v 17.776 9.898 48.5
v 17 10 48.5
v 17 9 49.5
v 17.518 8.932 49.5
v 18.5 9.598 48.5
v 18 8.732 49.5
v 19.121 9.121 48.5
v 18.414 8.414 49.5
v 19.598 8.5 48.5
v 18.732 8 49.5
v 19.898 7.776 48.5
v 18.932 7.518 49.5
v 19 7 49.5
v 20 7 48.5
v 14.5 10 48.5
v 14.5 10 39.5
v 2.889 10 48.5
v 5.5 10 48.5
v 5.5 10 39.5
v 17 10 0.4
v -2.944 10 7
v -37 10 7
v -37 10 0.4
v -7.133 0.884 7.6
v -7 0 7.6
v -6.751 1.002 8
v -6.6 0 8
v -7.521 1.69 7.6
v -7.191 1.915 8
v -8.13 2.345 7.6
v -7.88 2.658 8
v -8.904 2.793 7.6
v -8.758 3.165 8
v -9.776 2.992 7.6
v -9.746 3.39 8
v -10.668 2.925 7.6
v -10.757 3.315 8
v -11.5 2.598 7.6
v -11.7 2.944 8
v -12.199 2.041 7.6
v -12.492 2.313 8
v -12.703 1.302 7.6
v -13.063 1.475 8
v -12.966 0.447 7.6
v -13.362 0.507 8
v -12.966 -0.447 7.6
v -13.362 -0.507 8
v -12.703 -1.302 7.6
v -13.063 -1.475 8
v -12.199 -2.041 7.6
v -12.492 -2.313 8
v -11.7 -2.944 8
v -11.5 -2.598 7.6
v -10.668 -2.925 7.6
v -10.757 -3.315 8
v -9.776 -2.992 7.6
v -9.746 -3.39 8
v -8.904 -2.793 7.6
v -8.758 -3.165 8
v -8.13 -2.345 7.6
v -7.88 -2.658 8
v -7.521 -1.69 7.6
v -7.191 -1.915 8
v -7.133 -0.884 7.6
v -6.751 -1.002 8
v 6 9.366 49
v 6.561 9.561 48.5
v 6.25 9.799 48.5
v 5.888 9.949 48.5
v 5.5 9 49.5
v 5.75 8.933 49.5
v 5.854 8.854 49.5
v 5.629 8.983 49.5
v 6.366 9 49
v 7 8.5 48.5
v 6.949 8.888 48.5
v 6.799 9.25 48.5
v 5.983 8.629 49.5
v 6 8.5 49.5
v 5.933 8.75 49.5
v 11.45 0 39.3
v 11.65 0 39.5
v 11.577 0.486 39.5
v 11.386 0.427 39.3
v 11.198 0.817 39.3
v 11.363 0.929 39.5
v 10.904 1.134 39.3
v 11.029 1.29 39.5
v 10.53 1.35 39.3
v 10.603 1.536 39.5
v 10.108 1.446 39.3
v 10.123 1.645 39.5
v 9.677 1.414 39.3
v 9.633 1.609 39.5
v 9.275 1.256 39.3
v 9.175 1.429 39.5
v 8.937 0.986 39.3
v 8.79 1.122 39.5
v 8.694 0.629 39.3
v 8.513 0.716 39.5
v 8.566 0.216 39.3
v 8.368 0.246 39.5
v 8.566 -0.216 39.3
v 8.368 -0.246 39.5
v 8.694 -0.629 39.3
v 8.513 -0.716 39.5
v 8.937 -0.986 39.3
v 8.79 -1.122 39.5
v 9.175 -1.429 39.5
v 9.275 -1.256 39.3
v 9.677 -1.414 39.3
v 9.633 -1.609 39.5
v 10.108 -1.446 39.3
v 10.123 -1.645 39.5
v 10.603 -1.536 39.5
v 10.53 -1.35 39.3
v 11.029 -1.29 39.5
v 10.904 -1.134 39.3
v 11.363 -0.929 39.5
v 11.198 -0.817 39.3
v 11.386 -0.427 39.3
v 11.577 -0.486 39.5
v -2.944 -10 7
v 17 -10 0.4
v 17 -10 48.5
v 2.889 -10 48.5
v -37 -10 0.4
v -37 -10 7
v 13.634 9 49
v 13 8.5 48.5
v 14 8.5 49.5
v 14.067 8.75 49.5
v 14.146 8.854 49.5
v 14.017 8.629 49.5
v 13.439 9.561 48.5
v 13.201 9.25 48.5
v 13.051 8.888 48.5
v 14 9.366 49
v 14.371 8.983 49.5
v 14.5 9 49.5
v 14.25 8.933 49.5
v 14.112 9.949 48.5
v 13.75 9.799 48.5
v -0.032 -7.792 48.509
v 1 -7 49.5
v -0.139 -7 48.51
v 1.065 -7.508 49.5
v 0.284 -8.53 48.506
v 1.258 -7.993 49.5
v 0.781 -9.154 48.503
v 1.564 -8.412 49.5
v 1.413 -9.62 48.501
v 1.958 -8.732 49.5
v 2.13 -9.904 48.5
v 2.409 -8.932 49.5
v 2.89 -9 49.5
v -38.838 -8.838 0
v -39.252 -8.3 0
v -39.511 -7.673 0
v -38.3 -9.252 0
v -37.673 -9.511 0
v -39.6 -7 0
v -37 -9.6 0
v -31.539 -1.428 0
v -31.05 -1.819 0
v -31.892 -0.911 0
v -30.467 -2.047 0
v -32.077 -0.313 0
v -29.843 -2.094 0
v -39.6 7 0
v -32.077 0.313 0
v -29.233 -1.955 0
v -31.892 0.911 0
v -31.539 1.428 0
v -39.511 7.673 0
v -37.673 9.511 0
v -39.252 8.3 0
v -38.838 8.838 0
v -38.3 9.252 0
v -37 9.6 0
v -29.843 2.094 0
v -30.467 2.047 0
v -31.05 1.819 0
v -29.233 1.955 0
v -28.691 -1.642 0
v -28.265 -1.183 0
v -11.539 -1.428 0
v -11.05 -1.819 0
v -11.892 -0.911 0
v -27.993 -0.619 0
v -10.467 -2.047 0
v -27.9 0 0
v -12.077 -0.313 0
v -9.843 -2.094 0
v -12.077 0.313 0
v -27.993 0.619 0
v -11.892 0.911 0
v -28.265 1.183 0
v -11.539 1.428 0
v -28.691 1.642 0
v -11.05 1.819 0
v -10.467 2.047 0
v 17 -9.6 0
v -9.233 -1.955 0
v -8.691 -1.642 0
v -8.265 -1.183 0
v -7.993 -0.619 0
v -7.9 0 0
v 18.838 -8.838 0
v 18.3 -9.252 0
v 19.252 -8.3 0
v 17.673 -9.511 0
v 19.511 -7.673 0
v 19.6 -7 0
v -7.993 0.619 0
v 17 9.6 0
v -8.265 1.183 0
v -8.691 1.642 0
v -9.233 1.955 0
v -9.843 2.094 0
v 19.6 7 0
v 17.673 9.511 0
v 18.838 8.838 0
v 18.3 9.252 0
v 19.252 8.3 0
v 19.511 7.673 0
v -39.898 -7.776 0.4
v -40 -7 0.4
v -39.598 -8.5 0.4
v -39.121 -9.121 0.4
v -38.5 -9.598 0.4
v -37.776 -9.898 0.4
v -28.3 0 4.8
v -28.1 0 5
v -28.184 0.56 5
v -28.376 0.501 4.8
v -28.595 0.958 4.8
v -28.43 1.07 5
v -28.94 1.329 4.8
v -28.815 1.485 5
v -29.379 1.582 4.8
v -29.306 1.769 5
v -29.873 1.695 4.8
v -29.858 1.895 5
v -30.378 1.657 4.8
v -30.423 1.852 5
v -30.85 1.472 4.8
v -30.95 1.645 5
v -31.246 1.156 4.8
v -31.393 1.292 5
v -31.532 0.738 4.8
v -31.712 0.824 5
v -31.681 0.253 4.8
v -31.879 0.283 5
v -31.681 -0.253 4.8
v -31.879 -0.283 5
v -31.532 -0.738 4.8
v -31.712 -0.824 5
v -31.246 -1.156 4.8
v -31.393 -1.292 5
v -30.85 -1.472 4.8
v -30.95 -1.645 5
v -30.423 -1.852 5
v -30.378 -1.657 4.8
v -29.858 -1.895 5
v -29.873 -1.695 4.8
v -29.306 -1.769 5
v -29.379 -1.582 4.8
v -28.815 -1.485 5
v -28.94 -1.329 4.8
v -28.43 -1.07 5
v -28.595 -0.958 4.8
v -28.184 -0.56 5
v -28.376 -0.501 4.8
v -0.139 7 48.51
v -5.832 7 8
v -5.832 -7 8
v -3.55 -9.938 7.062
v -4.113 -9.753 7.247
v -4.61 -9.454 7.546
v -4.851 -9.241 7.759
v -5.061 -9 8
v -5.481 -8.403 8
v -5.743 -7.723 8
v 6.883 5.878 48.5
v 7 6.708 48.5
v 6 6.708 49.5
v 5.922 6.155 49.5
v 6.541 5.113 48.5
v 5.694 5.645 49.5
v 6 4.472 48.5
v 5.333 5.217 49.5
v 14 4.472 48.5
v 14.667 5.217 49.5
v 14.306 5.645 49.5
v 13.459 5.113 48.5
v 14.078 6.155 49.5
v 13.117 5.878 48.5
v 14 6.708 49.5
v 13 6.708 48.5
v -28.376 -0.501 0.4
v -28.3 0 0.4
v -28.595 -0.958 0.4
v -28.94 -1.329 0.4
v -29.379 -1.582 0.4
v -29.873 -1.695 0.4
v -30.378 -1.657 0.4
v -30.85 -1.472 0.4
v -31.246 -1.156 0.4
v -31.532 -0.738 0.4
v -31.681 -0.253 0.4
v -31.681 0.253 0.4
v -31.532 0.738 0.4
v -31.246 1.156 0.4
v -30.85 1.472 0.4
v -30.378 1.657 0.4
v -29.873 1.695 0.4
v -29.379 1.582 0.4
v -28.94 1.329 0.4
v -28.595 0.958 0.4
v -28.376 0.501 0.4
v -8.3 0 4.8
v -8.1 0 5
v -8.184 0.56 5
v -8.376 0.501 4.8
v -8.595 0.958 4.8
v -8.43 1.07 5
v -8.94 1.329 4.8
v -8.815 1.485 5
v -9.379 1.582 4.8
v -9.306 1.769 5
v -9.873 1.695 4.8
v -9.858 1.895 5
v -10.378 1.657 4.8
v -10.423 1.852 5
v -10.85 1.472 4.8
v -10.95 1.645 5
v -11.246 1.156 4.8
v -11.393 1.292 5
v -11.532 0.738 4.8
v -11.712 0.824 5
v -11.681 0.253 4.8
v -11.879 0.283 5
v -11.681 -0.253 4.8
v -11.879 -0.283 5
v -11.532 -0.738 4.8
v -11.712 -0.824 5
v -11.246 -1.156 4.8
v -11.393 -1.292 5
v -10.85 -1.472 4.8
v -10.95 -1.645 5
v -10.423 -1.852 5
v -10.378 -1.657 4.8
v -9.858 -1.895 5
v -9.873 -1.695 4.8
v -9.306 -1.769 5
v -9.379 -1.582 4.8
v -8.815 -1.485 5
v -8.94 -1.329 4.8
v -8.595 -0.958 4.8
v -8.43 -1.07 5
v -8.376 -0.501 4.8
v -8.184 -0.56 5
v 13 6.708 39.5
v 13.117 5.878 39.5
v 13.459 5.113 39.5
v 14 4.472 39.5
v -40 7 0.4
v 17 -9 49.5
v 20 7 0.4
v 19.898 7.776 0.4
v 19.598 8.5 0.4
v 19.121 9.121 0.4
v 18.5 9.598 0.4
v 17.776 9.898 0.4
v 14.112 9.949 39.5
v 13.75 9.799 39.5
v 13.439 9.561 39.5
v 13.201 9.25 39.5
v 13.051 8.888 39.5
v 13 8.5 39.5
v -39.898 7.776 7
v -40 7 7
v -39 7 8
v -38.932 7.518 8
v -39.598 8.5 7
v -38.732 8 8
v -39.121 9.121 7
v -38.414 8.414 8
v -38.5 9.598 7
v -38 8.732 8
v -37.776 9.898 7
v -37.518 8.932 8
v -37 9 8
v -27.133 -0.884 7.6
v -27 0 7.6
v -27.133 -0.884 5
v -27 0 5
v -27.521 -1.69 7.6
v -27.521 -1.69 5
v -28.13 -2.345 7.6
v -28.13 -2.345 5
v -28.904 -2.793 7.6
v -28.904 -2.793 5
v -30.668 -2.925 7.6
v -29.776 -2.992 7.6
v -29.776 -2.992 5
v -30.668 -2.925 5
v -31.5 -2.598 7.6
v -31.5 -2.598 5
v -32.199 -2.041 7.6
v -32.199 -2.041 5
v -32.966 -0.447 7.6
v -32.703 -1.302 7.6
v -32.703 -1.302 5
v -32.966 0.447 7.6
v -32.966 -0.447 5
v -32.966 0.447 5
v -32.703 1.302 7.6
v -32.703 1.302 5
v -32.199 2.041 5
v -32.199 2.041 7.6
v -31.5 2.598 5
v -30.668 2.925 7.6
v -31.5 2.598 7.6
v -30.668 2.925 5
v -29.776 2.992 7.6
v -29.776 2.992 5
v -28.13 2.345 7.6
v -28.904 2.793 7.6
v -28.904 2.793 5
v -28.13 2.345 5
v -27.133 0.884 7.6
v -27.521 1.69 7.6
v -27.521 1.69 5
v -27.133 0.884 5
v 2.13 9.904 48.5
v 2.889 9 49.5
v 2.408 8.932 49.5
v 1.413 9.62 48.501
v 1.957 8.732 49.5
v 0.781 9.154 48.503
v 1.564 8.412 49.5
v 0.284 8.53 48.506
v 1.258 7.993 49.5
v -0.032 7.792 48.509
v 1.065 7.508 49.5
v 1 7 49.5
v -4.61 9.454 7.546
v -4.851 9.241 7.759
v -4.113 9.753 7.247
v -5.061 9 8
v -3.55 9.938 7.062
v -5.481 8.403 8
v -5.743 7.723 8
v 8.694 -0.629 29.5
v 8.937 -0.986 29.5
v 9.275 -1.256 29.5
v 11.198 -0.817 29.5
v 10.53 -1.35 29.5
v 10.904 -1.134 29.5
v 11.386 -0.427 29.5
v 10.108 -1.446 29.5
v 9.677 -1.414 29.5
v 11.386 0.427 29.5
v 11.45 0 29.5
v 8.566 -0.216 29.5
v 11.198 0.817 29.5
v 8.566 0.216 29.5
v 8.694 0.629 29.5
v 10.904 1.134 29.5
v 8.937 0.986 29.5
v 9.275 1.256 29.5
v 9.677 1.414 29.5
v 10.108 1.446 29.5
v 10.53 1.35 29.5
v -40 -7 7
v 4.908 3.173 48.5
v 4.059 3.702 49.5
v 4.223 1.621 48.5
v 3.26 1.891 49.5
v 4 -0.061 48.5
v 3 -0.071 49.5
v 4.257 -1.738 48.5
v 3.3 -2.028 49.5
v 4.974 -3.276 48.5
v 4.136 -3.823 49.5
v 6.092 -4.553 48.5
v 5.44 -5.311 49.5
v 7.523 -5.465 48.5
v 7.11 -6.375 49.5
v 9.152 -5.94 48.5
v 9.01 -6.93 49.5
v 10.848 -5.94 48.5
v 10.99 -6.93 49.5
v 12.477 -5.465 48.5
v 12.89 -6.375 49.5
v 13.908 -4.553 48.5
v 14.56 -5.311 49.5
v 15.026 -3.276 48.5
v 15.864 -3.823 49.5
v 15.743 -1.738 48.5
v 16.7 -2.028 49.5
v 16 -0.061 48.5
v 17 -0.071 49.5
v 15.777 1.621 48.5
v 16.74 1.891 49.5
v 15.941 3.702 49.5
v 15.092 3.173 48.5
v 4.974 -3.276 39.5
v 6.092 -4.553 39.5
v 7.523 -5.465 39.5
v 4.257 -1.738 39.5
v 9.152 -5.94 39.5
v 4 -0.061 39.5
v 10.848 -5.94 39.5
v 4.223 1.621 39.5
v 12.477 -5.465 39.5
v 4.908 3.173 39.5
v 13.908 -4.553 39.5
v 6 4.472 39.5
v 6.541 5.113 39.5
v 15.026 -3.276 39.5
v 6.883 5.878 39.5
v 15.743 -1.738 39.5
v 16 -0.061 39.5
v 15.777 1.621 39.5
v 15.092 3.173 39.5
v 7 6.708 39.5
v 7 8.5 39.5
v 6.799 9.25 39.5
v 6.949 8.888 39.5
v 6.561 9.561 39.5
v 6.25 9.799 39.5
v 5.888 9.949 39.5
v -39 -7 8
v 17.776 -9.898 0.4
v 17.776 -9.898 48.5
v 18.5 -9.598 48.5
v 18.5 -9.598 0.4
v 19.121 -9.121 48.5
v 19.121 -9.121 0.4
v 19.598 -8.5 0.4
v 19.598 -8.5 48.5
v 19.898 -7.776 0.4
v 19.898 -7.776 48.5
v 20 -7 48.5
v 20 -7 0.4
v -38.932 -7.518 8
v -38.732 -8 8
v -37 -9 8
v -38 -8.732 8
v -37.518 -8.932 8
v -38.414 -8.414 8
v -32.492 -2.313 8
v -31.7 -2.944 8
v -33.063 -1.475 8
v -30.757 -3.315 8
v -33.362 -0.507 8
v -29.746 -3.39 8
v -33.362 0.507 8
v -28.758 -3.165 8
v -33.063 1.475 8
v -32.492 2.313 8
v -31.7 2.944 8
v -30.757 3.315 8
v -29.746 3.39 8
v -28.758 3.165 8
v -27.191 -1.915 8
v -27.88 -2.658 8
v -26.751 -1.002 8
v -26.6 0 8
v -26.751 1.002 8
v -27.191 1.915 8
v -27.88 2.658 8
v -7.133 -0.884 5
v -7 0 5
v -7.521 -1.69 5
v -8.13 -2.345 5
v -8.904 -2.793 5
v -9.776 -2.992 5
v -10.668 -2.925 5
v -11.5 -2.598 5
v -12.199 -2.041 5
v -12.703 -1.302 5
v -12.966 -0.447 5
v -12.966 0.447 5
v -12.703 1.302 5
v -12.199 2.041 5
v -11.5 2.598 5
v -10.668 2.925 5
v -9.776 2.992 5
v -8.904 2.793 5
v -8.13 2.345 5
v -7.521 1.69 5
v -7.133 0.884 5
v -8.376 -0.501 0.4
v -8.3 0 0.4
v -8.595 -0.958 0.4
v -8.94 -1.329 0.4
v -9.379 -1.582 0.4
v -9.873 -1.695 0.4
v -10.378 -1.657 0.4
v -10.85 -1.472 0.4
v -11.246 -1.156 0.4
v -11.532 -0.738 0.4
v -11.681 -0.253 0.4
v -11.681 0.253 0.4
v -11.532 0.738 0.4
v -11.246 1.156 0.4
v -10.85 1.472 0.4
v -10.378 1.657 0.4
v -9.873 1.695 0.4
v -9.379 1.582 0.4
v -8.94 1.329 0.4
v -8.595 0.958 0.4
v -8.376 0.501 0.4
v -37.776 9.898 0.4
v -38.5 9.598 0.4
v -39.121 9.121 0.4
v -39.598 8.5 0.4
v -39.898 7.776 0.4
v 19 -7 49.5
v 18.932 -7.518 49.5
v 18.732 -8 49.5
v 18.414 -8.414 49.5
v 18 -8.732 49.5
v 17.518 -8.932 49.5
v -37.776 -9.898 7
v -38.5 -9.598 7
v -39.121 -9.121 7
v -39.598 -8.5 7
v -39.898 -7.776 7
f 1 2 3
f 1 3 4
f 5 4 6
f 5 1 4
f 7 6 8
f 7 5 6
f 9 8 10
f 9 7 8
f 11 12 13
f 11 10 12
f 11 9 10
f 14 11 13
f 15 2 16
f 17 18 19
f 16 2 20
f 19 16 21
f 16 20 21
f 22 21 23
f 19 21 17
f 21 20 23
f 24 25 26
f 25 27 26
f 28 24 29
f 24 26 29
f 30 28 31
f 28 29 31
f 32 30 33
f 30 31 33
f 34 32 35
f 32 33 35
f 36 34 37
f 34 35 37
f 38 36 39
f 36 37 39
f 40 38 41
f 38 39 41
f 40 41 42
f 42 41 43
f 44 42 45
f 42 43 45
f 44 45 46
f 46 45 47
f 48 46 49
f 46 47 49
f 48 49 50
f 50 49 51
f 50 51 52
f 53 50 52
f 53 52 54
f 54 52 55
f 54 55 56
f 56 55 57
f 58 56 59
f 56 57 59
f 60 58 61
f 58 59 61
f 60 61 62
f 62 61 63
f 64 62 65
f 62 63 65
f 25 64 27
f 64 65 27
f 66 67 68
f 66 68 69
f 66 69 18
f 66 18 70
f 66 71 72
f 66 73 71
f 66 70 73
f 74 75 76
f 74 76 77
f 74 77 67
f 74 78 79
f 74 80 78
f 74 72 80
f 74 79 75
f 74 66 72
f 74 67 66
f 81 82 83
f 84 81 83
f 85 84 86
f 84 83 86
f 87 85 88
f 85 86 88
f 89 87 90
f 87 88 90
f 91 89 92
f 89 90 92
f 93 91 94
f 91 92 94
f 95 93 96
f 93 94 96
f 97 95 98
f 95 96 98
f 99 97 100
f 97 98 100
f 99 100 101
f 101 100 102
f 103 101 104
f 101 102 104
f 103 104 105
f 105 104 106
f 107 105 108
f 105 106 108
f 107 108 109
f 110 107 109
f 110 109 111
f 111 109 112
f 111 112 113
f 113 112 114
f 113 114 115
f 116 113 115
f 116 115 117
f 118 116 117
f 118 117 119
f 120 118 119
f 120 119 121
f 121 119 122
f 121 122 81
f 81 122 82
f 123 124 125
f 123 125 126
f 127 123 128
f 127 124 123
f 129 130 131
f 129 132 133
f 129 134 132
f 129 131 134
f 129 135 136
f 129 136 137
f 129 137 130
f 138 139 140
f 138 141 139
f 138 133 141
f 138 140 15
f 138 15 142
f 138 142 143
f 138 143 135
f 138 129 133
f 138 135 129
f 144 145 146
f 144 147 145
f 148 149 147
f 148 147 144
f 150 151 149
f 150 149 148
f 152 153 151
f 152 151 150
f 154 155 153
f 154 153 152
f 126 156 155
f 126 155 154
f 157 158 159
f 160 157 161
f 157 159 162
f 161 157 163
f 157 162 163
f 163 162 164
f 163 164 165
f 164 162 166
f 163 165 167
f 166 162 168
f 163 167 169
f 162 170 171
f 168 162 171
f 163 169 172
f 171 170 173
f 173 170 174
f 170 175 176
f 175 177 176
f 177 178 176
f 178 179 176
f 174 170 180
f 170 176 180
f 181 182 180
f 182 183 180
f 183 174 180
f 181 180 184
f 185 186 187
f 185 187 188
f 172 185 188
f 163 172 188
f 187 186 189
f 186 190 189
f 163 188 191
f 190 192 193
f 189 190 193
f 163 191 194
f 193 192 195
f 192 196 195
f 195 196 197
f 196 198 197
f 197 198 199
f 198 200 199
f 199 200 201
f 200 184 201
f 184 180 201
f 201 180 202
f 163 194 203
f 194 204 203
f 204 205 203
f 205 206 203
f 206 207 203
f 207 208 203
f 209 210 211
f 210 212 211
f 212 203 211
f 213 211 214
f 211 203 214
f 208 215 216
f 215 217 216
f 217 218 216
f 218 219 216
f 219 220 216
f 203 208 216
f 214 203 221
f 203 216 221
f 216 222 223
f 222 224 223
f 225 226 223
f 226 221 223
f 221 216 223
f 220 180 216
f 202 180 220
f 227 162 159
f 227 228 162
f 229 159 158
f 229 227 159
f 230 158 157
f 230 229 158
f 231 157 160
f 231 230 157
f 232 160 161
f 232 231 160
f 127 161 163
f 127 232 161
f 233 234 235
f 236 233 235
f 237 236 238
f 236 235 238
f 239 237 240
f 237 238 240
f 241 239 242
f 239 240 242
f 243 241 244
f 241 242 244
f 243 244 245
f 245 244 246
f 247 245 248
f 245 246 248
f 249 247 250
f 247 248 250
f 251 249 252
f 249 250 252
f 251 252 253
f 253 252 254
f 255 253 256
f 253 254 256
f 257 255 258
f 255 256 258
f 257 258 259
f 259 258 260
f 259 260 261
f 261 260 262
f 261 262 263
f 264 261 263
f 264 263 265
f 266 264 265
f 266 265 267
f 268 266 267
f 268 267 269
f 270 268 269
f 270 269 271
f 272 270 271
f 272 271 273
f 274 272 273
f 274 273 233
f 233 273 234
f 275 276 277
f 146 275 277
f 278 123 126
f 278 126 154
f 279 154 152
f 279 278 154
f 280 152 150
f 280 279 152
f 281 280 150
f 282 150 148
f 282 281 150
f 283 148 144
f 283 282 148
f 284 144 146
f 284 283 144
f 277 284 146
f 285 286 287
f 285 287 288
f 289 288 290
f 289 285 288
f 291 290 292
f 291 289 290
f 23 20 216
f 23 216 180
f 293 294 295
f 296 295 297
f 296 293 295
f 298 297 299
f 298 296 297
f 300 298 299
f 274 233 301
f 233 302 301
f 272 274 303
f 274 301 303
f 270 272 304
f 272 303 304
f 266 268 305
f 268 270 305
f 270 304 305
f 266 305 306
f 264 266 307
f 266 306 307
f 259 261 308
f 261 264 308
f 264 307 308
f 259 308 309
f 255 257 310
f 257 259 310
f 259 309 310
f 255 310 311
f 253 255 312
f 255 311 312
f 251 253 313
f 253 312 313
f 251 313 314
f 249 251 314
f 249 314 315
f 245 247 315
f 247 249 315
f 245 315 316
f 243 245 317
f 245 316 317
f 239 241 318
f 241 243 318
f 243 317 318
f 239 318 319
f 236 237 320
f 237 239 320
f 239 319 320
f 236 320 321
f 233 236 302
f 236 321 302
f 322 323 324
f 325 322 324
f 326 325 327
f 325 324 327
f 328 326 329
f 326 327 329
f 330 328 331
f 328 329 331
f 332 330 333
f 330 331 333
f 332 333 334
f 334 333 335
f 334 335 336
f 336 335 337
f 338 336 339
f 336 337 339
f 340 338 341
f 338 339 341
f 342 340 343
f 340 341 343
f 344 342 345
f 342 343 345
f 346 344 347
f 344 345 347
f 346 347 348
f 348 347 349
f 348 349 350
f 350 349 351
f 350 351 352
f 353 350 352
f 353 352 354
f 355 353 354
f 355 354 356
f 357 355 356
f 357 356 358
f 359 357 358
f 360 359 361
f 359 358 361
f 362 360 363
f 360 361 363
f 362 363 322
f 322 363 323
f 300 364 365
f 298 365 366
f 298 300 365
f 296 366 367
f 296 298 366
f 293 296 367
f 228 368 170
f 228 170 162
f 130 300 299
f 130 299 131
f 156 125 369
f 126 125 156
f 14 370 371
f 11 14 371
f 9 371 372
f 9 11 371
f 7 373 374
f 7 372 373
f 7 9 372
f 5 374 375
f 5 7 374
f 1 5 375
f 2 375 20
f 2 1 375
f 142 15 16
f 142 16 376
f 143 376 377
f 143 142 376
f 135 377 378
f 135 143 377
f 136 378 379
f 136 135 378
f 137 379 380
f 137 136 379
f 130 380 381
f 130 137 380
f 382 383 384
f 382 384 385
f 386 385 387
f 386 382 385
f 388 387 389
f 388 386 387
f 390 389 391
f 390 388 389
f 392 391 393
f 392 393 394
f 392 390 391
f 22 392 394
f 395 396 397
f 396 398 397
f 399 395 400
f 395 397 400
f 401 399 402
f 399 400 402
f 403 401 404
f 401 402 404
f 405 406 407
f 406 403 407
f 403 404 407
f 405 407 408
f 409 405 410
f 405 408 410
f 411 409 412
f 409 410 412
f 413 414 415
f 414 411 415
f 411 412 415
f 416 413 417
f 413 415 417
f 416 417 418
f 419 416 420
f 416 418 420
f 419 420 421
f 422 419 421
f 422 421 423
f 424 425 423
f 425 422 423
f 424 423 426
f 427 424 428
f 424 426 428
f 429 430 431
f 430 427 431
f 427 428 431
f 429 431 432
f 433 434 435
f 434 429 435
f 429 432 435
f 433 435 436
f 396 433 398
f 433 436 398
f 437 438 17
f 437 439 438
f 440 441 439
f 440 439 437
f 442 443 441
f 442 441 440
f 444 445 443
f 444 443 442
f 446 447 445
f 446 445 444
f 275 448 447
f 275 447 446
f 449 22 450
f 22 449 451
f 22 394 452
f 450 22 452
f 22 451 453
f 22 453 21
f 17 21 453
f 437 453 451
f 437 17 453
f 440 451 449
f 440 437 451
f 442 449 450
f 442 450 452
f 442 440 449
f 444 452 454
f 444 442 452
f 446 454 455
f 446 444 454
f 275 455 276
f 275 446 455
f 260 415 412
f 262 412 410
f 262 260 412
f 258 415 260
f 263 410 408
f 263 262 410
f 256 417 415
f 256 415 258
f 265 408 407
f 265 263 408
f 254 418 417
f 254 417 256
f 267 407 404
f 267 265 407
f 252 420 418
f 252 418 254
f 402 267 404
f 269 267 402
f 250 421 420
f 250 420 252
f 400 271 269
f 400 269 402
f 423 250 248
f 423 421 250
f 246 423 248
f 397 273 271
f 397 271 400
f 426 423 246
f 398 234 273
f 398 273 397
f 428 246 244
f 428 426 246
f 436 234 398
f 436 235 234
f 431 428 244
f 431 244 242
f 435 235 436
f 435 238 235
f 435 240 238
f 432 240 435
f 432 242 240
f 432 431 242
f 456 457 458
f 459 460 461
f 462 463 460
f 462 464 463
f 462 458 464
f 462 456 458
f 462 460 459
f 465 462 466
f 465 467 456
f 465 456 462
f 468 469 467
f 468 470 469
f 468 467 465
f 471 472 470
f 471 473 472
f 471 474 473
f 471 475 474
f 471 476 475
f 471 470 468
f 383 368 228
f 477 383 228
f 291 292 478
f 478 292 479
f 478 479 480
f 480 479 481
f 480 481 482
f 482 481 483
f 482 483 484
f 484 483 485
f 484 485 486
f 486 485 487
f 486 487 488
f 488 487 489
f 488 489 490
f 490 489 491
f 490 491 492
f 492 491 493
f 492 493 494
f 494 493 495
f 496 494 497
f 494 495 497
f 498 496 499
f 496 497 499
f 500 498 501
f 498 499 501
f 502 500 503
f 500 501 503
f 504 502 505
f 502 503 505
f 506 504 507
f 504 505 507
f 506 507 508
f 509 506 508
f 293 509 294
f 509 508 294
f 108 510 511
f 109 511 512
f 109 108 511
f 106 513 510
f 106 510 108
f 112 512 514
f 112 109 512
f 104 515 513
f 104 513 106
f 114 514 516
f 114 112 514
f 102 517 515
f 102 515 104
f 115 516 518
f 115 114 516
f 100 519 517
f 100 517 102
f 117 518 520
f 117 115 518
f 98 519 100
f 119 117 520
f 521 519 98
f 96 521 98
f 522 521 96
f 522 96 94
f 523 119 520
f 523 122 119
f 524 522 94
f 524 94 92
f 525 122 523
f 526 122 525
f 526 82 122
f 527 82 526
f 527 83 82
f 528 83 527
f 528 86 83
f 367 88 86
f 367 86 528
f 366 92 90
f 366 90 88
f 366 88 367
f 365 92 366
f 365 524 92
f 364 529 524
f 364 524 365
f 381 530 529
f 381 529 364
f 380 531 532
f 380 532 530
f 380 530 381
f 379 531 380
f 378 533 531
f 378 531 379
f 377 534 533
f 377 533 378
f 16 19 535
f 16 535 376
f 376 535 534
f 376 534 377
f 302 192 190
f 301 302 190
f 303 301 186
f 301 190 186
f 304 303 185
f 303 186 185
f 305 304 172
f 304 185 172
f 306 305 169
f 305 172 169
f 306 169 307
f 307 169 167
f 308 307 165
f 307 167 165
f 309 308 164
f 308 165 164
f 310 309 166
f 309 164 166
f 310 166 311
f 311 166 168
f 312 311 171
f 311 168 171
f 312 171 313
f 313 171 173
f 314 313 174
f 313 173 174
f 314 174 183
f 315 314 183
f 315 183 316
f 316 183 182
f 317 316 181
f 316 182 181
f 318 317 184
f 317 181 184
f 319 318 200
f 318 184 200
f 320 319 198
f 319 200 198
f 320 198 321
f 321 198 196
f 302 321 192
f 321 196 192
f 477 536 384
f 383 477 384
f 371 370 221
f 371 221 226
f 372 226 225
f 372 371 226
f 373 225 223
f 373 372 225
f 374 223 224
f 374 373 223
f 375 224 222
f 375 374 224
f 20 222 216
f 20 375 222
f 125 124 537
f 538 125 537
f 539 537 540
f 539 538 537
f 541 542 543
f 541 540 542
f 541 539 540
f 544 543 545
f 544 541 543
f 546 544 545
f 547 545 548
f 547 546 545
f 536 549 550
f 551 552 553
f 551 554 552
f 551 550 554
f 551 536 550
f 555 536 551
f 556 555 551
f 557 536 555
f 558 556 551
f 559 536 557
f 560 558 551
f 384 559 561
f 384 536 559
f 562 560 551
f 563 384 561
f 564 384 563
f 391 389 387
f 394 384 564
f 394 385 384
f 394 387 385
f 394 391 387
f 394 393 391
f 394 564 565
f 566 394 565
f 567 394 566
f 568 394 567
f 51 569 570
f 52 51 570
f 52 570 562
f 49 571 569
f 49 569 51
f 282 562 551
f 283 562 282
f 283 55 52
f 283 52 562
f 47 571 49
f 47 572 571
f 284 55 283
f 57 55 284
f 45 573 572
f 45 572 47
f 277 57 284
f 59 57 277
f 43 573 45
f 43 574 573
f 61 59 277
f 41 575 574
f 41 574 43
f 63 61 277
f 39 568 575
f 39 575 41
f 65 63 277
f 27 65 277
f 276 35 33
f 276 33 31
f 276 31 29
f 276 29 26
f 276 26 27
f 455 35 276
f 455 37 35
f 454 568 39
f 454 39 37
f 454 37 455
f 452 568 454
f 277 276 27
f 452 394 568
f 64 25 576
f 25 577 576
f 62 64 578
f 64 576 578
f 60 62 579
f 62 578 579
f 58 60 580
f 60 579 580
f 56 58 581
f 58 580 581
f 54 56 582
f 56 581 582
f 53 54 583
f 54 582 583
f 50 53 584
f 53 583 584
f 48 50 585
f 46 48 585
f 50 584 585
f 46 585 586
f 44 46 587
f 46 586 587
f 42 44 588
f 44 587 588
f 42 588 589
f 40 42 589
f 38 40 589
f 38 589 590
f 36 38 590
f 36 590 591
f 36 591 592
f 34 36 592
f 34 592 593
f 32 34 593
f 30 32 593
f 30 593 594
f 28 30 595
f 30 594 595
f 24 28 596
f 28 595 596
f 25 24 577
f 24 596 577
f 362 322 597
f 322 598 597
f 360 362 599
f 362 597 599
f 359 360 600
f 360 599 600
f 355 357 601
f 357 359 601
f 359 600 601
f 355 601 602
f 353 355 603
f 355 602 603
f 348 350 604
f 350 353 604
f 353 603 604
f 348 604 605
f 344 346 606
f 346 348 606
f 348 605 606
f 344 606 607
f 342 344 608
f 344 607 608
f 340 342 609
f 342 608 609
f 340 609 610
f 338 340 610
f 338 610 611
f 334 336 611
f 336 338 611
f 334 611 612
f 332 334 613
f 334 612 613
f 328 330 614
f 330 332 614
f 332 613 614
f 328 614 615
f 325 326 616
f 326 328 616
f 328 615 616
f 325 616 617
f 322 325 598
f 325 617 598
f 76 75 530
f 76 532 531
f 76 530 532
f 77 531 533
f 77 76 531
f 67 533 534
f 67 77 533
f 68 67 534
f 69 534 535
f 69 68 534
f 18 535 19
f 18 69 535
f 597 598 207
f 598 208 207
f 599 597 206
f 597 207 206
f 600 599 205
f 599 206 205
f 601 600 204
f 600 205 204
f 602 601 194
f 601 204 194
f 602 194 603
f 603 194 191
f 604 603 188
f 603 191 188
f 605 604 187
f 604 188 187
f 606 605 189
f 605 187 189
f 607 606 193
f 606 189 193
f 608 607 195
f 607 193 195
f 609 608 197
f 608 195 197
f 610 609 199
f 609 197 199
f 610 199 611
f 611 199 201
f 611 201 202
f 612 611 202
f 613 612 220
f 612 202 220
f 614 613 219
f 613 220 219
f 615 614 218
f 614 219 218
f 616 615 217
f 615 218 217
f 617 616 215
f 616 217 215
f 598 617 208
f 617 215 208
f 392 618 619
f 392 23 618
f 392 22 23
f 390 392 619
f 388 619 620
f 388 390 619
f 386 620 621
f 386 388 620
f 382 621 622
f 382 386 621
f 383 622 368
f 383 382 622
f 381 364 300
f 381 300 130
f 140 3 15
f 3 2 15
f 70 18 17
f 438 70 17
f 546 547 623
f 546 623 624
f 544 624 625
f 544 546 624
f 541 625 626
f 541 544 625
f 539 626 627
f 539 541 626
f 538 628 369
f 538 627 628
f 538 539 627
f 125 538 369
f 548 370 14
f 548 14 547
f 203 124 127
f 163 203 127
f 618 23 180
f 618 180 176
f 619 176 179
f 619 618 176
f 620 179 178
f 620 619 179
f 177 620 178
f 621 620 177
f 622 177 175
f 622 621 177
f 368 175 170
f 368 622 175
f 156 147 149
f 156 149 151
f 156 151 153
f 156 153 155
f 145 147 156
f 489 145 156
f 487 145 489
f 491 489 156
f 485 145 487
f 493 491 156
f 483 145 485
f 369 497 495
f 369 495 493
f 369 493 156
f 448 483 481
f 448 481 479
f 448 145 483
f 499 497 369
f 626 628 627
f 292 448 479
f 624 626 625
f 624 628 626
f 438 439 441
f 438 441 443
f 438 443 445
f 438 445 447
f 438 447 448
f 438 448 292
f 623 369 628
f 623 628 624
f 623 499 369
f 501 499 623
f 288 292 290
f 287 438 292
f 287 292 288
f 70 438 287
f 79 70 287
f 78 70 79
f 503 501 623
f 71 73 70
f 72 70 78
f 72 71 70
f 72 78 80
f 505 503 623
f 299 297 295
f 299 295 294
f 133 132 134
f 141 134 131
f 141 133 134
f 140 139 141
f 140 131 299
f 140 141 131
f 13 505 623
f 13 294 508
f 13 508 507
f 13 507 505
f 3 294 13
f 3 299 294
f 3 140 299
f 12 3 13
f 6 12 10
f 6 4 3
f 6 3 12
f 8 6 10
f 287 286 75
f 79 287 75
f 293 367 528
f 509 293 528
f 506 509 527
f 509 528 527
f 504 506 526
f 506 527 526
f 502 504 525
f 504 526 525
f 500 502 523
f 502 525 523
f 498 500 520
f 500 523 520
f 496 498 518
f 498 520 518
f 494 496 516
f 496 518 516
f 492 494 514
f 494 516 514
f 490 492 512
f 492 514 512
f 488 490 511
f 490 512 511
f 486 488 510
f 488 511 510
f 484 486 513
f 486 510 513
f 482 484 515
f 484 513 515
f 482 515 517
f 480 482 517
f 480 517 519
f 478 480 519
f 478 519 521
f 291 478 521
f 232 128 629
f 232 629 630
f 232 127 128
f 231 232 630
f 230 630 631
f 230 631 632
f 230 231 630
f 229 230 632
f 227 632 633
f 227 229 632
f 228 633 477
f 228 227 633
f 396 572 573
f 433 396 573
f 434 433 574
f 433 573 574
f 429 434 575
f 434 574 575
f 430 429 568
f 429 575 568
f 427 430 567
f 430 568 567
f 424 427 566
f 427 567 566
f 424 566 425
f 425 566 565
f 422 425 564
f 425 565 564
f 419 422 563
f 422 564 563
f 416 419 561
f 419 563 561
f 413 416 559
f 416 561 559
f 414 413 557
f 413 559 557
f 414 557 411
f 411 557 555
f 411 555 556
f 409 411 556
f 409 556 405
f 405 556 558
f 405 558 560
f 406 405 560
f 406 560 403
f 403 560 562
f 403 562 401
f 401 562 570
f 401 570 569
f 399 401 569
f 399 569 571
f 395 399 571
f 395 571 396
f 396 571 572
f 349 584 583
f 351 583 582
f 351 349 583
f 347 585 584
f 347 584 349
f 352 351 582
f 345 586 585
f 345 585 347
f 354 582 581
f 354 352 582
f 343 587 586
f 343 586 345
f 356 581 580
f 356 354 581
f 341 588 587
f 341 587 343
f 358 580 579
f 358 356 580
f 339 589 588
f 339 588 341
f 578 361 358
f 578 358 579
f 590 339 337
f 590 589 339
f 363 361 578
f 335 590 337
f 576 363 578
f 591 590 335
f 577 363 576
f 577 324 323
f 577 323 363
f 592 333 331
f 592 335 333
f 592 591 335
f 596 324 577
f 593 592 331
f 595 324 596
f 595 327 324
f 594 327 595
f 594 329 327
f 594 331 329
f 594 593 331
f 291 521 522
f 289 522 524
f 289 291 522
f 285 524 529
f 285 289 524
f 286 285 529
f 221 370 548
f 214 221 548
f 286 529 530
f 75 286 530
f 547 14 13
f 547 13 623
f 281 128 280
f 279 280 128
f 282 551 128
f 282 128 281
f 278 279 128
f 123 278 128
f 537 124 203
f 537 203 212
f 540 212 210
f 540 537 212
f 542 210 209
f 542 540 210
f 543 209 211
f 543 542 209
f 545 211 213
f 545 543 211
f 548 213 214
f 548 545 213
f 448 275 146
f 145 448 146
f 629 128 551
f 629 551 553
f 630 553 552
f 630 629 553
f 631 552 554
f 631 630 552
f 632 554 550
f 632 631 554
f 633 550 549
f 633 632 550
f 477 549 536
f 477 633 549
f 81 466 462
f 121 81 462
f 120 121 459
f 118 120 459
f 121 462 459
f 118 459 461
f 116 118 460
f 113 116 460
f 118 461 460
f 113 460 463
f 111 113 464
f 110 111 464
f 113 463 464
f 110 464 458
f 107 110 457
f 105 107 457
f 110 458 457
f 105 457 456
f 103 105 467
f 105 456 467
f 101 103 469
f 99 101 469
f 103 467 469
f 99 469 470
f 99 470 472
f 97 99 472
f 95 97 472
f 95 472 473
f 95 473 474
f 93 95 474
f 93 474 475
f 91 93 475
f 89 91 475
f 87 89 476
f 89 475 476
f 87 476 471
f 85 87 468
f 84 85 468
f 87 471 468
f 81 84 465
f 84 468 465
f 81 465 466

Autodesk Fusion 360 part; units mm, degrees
sketch "Sketch1" plane through (0, 0, 0) normal (0, 0, 1) x (1, 0, 0)
  line L0 (20, -10) -> (-20, -10)
  line L1 (-20, -10) -> (-20, 10)
  line L2 (-20, 10) -> (20, 10)
  line L3 (20, 10) -> (20, -10)
  line L4 (20, -10) -> (-20, 10) construction
  line L5 (-20, -10) -> (20, 10) construction
  line L6 (10, 10) -> (10, -10)
  line L7 (-10, 10) -> (-10, -10) construction
  circle A0 centre (-10, 0) radius 1.7
  circle A1 centre (-10, 0) radius 3
  circle A2 centre (10, 0) radius 1.45
  circle A3 centre (10, 0) radius 3
  line L8 (-20, 3) -> (20, 3)
  line L9 (-20, -3) -> (20, -3)
  circle A4 centre (10, 0) radius 6
  line L10 (13, 5.1962) -> (13, 10)
  line L11 (7, 5.1962) -> (7, 10)
  line L12 (-7, 3) -> (-7, -3)
  line L13 (7, 3) -> (7, -3)
  line L14 (0, 10) -> (0, -10)
  line L15 (-20, 10) -> (-40, 10)
  line L16 (-40, 10) -> (-40, -10)
  line L17 (-40, -10) -> (-20, -10)
  line L18 (-40, 0) -> (-20, 0) construction
  circle A5 centre (-30, 0) radius 1.7
  circle A6 centre (-30, 0) radius 3
  dimension "d1" = 40
  dimension "d2" = 20
  dimension "d3" = 10
  dimension "d4" = 10
  dimension "d5" = 3.4
  dimension "d6" = 6
  dimension "d7" = 12
  dimension "d8" = 6
  dimension "d15" = 2.9
  dimension "d36" = 20
extrude "Extrude1" add sketch "Sketch1" against normal blind 1.2 contours L8 L9 A4 L14 | L8 L9 L12 L14 | L8 L9 A4 L13
extrude "Extrude2" add sketch "Sketch1" along normal blind 39.5 contours L0 L3 L6 L9 A4 | L0 L6 L9 A4 L14 | L3 L8 L9 A4 | L6 L9 A4 | L6 L9 A4 | L2 L3 L8 A4 L10 | A3 L8 L9 A4 | L8 L9 A4 L14 | L6 A2 A3 | A3 L9 L13 | L6 A2 A3 | L8 L9 A4 L13 | L6 L8 A4 | L2 L8 A4 L11 L14 | L6 A2 | L6 A2 | A3 L8 L13 | L6 L8 A4 | L2 L6 A4 L10 | L2 L6 A4 L11
extrude "Extrude3" cut sketch "Sketch1" along normal blind 39.5 contours L6 A2 | L6 A2
extrude "Extrude4" add sketch "Sketch1" along normal blind 29.5 contours L6 A2 | L6 A2
extrude "Extrude5" add sketch "Sketch1" along normal blind 5 contours L0 L1 L9 L14 | L1 L15 L16 L17 | L8 L9 L12 L14 | L1 A1 L8 L9 | A1 L9 L12 | L1 L2 L8 L14 | A1 | A1 L8 L12 | A6
extrude "Extrude6" add sketch "Sketch1" along normal blind 3 from surface at 5 contours L0 L1 L9 L14 | L1 L15 L16 L17 | L8 L9 L12 L14 | L1 A1 L8 L9 | A1 L9 L12 | L1 L2 L8 L14 | A1 L8 L12
extrude "Extrude8" add sketch "Sketch1" along normal blind 10 from surface at 39.5 contours L0 L3 L6 L9 A4 | L0 L6 L9 A4 L14 | L3 L8 L9 A4 | L2 L3 L8 A4 L10 | L8 L9 A4 L14 | L2 L8 A4 L11 L14
fillet "Fillet3" radius 3 2 edges at (7, 5.1962, 44.5) (13, 5.1962, 44.5)
draft "Draft1" angle 8 neutral plane through (0, 0, 49.5) pull (0, 0, 1) 1 faces at (0, 3.3333, 21.8333)
fillet "Fillet1" radius 3 6 edges at (20, -10, 24.75) (20, 10, 24.75) (-2.9162, 10, 28.75) (-2.9162, -10, 28.75) (-40, -10, 4) (-40, 10, 4)
chamfer "Chamfer1" distance 0.4 angle 45 2 edges at (-12.797, 1.0848, 8) (-32.797, 1.0848, 8)
chamfer "Chamfer2" distance 0.2 angle 45 2 edges at (-11.585, 0.6147, 5) (-31.585, 0.6147, 5)
chamfer "Chamfer3" distance 0.2 angle 45 1 edges at (8.6481, 0.5243, 39.5)
chamfer "Chamfer4" distance 1 angle 45 5 edges at (-19.9015, 10, 8) (-39.1213, 9.1213, 8) (-40, 0, 8) (-39.1213, -9.1213, 8) (-19.9015, -10, 8)
extrude "Extrude7" cut 1 faces at (-2.3333, 1, -1.2) along direction (0, 0, 1) blind 1.2
chamfer "Chamfer5" distance 0.4 angle 45 1 faces at (8.5667, 0, 0)
fillet "Fillet4" radius 1.5 2 edges at (7, 10, 44.5) (13, 10, 44.5)
chamfer "Chamfer6" distance 1 angle 45 16 edges at (0, 0, 49.5) (0.8873, -9.1213, 49.5) (10.0147, -10, 49.5) (19.1213, -9.1213, 49.5) (20, 0, 49.5) (19.1213, 9.1213, 49.5) (15.75, 10, 49.5) (13.4393, 9.5607, 49.5) (13, 7.6041, 49.5) (13.2614, 5.4835, 49.5) (10, -6, 49.5) (6.7386, 5.4835, 49.5) (7, 7.6041, 49.5) (6.5607, 9.5607, 49.5) (4.2647, 10, 49.5) (0.8873, 9.1213, 49.5)
equation "d9 = -( 2 mm - 0.8 mm )"
equation "d16 = 39.50 mm - 10 mm"
